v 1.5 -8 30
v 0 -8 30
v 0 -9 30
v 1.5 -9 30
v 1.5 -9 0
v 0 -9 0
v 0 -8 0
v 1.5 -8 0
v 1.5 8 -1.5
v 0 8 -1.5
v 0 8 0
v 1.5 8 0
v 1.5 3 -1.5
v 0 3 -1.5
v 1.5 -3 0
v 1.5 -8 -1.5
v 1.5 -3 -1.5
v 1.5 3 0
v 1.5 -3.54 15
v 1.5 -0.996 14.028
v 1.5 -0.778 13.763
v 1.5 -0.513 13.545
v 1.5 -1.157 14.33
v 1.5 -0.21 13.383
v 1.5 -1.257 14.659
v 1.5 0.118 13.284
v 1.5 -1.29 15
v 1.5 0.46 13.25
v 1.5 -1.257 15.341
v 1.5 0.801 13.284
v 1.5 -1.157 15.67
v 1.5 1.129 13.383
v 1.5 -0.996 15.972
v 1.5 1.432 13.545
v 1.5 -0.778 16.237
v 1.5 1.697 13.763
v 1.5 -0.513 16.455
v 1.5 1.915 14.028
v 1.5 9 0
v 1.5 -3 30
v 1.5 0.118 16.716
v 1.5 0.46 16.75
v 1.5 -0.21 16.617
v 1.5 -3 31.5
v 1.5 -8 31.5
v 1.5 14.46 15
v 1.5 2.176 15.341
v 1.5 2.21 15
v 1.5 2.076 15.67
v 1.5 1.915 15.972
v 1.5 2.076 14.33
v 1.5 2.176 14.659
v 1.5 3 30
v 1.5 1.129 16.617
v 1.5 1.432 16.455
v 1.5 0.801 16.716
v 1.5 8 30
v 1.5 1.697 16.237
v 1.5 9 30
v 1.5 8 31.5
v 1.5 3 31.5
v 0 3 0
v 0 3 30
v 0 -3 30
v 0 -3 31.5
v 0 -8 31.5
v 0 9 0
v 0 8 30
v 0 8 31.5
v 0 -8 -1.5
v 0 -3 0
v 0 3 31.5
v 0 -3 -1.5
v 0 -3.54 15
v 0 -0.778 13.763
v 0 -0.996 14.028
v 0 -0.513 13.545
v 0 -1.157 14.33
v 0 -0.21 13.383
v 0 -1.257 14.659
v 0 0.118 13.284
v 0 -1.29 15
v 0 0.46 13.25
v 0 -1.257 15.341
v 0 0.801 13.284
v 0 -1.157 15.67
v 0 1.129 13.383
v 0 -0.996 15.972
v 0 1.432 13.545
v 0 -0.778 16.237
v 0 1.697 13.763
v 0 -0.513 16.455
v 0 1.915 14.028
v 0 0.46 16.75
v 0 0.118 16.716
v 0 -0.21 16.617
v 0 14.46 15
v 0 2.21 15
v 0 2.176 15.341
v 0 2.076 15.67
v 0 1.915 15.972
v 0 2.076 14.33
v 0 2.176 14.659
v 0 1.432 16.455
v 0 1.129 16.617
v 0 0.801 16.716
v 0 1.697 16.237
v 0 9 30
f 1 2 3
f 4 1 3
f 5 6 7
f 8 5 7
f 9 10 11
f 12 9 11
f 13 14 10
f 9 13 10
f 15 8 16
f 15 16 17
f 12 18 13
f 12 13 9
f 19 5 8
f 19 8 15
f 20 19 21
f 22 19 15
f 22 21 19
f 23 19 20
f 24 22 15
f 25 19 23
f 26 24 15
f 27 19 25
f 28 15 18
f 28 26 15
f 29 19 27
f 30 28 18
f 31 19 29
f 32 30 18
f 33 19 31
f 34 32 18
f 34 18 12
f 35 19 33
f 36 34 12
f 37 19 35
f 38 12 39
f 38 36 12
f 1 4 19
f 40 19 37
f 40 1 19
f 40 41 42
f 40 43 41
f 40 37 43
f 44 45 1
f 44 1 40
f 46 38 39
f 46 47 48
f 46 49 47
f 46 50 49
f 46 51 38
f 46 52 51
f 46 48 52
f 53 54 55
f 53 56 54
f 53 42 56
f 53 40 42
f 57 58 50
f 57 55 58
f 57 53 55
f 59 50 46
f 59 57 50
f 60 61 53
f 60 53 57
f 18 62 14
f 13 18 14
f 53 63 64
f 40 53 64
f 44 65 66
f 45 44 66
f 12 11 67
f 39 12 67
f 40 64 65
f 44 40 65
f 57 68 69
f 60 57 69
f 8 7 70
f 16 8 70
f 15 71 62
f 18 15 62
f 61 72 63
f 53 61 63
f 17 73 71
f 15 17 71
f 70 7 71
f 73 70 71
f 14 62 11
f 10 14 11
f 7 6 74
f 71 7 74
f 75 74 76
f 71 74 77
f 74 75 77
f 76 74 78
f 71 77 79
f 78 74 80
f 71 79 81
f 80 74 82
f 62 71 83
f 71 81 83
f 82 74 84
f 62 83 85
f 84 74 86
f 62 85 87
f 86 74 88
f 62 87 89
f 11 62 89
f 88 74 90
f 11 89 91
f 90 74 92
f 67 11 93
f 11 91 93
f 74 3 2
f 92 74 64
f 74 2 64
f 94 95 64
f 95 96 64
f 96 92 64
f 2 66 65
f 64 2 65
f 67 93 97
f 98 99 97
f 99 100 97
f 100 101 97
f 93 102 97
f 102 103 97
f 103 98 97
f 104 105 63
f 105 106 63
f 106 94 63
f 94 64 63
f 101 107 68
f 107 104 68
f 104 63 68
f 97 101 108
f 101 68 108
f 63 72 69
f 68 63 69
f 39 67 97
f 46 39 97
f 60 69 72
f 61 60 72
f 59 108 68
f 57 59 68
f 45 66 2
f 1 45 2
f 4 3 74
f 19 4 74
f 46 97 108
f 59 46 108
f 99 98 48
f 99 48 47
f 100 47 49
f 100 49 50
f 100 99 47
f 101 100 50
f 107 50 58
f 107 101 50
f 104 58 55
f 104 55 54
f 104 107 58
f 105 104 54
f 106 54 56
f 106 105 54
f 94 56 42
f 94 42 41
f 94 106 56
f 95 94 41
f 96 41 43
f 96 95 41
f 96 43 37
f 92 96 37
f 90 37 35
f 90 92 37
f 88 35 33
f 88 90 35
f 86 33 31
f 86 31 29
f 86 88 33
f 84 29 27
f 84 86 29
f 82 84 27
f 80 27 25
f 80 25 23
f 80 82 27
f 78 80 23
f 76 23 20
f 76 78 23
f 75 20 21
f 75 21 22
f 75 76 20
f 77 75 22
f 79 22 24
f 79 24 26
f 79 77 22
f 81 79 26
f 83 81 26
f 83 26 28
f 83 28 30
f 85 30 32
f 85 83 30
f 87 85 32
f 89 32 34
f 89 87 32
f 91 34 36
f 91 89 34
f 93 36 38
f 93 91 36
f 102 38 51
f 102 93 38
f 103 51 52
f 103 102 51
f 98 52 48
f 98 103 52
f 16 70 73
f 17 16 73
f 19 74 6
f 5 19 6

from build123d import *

# Parameters (mm, degrees)
F0_R     = 1.75
F1_DEPTH = 1.5


with BuildPart() as f1:
    # F0 (on Right) → F1 (new body)
    with BuildSketch(Plane.YZ):
        Polygon((-3, -1.5), (-3, 0), (3, 0), (3, -1.5), (8, -1.5), (8, 0), (9, 0), (14.459554, 15), (9, 30), (8, 30), (8, 31.5), (3, 31.5), (3, 30), (-3, 30), (-3, 31.5), (-8, 31.5), (-8, 30), (-9, 30), (-3.540446, 15), (-9, 0), (-8, 0), (-8, -1.5), align=None)
        with Locations((0.459554, 15)):
            Circle(F0_R, mode=Mode.SUBTRACT)
    extrude(amount=F1_DEPTH)


solid = f1.part
